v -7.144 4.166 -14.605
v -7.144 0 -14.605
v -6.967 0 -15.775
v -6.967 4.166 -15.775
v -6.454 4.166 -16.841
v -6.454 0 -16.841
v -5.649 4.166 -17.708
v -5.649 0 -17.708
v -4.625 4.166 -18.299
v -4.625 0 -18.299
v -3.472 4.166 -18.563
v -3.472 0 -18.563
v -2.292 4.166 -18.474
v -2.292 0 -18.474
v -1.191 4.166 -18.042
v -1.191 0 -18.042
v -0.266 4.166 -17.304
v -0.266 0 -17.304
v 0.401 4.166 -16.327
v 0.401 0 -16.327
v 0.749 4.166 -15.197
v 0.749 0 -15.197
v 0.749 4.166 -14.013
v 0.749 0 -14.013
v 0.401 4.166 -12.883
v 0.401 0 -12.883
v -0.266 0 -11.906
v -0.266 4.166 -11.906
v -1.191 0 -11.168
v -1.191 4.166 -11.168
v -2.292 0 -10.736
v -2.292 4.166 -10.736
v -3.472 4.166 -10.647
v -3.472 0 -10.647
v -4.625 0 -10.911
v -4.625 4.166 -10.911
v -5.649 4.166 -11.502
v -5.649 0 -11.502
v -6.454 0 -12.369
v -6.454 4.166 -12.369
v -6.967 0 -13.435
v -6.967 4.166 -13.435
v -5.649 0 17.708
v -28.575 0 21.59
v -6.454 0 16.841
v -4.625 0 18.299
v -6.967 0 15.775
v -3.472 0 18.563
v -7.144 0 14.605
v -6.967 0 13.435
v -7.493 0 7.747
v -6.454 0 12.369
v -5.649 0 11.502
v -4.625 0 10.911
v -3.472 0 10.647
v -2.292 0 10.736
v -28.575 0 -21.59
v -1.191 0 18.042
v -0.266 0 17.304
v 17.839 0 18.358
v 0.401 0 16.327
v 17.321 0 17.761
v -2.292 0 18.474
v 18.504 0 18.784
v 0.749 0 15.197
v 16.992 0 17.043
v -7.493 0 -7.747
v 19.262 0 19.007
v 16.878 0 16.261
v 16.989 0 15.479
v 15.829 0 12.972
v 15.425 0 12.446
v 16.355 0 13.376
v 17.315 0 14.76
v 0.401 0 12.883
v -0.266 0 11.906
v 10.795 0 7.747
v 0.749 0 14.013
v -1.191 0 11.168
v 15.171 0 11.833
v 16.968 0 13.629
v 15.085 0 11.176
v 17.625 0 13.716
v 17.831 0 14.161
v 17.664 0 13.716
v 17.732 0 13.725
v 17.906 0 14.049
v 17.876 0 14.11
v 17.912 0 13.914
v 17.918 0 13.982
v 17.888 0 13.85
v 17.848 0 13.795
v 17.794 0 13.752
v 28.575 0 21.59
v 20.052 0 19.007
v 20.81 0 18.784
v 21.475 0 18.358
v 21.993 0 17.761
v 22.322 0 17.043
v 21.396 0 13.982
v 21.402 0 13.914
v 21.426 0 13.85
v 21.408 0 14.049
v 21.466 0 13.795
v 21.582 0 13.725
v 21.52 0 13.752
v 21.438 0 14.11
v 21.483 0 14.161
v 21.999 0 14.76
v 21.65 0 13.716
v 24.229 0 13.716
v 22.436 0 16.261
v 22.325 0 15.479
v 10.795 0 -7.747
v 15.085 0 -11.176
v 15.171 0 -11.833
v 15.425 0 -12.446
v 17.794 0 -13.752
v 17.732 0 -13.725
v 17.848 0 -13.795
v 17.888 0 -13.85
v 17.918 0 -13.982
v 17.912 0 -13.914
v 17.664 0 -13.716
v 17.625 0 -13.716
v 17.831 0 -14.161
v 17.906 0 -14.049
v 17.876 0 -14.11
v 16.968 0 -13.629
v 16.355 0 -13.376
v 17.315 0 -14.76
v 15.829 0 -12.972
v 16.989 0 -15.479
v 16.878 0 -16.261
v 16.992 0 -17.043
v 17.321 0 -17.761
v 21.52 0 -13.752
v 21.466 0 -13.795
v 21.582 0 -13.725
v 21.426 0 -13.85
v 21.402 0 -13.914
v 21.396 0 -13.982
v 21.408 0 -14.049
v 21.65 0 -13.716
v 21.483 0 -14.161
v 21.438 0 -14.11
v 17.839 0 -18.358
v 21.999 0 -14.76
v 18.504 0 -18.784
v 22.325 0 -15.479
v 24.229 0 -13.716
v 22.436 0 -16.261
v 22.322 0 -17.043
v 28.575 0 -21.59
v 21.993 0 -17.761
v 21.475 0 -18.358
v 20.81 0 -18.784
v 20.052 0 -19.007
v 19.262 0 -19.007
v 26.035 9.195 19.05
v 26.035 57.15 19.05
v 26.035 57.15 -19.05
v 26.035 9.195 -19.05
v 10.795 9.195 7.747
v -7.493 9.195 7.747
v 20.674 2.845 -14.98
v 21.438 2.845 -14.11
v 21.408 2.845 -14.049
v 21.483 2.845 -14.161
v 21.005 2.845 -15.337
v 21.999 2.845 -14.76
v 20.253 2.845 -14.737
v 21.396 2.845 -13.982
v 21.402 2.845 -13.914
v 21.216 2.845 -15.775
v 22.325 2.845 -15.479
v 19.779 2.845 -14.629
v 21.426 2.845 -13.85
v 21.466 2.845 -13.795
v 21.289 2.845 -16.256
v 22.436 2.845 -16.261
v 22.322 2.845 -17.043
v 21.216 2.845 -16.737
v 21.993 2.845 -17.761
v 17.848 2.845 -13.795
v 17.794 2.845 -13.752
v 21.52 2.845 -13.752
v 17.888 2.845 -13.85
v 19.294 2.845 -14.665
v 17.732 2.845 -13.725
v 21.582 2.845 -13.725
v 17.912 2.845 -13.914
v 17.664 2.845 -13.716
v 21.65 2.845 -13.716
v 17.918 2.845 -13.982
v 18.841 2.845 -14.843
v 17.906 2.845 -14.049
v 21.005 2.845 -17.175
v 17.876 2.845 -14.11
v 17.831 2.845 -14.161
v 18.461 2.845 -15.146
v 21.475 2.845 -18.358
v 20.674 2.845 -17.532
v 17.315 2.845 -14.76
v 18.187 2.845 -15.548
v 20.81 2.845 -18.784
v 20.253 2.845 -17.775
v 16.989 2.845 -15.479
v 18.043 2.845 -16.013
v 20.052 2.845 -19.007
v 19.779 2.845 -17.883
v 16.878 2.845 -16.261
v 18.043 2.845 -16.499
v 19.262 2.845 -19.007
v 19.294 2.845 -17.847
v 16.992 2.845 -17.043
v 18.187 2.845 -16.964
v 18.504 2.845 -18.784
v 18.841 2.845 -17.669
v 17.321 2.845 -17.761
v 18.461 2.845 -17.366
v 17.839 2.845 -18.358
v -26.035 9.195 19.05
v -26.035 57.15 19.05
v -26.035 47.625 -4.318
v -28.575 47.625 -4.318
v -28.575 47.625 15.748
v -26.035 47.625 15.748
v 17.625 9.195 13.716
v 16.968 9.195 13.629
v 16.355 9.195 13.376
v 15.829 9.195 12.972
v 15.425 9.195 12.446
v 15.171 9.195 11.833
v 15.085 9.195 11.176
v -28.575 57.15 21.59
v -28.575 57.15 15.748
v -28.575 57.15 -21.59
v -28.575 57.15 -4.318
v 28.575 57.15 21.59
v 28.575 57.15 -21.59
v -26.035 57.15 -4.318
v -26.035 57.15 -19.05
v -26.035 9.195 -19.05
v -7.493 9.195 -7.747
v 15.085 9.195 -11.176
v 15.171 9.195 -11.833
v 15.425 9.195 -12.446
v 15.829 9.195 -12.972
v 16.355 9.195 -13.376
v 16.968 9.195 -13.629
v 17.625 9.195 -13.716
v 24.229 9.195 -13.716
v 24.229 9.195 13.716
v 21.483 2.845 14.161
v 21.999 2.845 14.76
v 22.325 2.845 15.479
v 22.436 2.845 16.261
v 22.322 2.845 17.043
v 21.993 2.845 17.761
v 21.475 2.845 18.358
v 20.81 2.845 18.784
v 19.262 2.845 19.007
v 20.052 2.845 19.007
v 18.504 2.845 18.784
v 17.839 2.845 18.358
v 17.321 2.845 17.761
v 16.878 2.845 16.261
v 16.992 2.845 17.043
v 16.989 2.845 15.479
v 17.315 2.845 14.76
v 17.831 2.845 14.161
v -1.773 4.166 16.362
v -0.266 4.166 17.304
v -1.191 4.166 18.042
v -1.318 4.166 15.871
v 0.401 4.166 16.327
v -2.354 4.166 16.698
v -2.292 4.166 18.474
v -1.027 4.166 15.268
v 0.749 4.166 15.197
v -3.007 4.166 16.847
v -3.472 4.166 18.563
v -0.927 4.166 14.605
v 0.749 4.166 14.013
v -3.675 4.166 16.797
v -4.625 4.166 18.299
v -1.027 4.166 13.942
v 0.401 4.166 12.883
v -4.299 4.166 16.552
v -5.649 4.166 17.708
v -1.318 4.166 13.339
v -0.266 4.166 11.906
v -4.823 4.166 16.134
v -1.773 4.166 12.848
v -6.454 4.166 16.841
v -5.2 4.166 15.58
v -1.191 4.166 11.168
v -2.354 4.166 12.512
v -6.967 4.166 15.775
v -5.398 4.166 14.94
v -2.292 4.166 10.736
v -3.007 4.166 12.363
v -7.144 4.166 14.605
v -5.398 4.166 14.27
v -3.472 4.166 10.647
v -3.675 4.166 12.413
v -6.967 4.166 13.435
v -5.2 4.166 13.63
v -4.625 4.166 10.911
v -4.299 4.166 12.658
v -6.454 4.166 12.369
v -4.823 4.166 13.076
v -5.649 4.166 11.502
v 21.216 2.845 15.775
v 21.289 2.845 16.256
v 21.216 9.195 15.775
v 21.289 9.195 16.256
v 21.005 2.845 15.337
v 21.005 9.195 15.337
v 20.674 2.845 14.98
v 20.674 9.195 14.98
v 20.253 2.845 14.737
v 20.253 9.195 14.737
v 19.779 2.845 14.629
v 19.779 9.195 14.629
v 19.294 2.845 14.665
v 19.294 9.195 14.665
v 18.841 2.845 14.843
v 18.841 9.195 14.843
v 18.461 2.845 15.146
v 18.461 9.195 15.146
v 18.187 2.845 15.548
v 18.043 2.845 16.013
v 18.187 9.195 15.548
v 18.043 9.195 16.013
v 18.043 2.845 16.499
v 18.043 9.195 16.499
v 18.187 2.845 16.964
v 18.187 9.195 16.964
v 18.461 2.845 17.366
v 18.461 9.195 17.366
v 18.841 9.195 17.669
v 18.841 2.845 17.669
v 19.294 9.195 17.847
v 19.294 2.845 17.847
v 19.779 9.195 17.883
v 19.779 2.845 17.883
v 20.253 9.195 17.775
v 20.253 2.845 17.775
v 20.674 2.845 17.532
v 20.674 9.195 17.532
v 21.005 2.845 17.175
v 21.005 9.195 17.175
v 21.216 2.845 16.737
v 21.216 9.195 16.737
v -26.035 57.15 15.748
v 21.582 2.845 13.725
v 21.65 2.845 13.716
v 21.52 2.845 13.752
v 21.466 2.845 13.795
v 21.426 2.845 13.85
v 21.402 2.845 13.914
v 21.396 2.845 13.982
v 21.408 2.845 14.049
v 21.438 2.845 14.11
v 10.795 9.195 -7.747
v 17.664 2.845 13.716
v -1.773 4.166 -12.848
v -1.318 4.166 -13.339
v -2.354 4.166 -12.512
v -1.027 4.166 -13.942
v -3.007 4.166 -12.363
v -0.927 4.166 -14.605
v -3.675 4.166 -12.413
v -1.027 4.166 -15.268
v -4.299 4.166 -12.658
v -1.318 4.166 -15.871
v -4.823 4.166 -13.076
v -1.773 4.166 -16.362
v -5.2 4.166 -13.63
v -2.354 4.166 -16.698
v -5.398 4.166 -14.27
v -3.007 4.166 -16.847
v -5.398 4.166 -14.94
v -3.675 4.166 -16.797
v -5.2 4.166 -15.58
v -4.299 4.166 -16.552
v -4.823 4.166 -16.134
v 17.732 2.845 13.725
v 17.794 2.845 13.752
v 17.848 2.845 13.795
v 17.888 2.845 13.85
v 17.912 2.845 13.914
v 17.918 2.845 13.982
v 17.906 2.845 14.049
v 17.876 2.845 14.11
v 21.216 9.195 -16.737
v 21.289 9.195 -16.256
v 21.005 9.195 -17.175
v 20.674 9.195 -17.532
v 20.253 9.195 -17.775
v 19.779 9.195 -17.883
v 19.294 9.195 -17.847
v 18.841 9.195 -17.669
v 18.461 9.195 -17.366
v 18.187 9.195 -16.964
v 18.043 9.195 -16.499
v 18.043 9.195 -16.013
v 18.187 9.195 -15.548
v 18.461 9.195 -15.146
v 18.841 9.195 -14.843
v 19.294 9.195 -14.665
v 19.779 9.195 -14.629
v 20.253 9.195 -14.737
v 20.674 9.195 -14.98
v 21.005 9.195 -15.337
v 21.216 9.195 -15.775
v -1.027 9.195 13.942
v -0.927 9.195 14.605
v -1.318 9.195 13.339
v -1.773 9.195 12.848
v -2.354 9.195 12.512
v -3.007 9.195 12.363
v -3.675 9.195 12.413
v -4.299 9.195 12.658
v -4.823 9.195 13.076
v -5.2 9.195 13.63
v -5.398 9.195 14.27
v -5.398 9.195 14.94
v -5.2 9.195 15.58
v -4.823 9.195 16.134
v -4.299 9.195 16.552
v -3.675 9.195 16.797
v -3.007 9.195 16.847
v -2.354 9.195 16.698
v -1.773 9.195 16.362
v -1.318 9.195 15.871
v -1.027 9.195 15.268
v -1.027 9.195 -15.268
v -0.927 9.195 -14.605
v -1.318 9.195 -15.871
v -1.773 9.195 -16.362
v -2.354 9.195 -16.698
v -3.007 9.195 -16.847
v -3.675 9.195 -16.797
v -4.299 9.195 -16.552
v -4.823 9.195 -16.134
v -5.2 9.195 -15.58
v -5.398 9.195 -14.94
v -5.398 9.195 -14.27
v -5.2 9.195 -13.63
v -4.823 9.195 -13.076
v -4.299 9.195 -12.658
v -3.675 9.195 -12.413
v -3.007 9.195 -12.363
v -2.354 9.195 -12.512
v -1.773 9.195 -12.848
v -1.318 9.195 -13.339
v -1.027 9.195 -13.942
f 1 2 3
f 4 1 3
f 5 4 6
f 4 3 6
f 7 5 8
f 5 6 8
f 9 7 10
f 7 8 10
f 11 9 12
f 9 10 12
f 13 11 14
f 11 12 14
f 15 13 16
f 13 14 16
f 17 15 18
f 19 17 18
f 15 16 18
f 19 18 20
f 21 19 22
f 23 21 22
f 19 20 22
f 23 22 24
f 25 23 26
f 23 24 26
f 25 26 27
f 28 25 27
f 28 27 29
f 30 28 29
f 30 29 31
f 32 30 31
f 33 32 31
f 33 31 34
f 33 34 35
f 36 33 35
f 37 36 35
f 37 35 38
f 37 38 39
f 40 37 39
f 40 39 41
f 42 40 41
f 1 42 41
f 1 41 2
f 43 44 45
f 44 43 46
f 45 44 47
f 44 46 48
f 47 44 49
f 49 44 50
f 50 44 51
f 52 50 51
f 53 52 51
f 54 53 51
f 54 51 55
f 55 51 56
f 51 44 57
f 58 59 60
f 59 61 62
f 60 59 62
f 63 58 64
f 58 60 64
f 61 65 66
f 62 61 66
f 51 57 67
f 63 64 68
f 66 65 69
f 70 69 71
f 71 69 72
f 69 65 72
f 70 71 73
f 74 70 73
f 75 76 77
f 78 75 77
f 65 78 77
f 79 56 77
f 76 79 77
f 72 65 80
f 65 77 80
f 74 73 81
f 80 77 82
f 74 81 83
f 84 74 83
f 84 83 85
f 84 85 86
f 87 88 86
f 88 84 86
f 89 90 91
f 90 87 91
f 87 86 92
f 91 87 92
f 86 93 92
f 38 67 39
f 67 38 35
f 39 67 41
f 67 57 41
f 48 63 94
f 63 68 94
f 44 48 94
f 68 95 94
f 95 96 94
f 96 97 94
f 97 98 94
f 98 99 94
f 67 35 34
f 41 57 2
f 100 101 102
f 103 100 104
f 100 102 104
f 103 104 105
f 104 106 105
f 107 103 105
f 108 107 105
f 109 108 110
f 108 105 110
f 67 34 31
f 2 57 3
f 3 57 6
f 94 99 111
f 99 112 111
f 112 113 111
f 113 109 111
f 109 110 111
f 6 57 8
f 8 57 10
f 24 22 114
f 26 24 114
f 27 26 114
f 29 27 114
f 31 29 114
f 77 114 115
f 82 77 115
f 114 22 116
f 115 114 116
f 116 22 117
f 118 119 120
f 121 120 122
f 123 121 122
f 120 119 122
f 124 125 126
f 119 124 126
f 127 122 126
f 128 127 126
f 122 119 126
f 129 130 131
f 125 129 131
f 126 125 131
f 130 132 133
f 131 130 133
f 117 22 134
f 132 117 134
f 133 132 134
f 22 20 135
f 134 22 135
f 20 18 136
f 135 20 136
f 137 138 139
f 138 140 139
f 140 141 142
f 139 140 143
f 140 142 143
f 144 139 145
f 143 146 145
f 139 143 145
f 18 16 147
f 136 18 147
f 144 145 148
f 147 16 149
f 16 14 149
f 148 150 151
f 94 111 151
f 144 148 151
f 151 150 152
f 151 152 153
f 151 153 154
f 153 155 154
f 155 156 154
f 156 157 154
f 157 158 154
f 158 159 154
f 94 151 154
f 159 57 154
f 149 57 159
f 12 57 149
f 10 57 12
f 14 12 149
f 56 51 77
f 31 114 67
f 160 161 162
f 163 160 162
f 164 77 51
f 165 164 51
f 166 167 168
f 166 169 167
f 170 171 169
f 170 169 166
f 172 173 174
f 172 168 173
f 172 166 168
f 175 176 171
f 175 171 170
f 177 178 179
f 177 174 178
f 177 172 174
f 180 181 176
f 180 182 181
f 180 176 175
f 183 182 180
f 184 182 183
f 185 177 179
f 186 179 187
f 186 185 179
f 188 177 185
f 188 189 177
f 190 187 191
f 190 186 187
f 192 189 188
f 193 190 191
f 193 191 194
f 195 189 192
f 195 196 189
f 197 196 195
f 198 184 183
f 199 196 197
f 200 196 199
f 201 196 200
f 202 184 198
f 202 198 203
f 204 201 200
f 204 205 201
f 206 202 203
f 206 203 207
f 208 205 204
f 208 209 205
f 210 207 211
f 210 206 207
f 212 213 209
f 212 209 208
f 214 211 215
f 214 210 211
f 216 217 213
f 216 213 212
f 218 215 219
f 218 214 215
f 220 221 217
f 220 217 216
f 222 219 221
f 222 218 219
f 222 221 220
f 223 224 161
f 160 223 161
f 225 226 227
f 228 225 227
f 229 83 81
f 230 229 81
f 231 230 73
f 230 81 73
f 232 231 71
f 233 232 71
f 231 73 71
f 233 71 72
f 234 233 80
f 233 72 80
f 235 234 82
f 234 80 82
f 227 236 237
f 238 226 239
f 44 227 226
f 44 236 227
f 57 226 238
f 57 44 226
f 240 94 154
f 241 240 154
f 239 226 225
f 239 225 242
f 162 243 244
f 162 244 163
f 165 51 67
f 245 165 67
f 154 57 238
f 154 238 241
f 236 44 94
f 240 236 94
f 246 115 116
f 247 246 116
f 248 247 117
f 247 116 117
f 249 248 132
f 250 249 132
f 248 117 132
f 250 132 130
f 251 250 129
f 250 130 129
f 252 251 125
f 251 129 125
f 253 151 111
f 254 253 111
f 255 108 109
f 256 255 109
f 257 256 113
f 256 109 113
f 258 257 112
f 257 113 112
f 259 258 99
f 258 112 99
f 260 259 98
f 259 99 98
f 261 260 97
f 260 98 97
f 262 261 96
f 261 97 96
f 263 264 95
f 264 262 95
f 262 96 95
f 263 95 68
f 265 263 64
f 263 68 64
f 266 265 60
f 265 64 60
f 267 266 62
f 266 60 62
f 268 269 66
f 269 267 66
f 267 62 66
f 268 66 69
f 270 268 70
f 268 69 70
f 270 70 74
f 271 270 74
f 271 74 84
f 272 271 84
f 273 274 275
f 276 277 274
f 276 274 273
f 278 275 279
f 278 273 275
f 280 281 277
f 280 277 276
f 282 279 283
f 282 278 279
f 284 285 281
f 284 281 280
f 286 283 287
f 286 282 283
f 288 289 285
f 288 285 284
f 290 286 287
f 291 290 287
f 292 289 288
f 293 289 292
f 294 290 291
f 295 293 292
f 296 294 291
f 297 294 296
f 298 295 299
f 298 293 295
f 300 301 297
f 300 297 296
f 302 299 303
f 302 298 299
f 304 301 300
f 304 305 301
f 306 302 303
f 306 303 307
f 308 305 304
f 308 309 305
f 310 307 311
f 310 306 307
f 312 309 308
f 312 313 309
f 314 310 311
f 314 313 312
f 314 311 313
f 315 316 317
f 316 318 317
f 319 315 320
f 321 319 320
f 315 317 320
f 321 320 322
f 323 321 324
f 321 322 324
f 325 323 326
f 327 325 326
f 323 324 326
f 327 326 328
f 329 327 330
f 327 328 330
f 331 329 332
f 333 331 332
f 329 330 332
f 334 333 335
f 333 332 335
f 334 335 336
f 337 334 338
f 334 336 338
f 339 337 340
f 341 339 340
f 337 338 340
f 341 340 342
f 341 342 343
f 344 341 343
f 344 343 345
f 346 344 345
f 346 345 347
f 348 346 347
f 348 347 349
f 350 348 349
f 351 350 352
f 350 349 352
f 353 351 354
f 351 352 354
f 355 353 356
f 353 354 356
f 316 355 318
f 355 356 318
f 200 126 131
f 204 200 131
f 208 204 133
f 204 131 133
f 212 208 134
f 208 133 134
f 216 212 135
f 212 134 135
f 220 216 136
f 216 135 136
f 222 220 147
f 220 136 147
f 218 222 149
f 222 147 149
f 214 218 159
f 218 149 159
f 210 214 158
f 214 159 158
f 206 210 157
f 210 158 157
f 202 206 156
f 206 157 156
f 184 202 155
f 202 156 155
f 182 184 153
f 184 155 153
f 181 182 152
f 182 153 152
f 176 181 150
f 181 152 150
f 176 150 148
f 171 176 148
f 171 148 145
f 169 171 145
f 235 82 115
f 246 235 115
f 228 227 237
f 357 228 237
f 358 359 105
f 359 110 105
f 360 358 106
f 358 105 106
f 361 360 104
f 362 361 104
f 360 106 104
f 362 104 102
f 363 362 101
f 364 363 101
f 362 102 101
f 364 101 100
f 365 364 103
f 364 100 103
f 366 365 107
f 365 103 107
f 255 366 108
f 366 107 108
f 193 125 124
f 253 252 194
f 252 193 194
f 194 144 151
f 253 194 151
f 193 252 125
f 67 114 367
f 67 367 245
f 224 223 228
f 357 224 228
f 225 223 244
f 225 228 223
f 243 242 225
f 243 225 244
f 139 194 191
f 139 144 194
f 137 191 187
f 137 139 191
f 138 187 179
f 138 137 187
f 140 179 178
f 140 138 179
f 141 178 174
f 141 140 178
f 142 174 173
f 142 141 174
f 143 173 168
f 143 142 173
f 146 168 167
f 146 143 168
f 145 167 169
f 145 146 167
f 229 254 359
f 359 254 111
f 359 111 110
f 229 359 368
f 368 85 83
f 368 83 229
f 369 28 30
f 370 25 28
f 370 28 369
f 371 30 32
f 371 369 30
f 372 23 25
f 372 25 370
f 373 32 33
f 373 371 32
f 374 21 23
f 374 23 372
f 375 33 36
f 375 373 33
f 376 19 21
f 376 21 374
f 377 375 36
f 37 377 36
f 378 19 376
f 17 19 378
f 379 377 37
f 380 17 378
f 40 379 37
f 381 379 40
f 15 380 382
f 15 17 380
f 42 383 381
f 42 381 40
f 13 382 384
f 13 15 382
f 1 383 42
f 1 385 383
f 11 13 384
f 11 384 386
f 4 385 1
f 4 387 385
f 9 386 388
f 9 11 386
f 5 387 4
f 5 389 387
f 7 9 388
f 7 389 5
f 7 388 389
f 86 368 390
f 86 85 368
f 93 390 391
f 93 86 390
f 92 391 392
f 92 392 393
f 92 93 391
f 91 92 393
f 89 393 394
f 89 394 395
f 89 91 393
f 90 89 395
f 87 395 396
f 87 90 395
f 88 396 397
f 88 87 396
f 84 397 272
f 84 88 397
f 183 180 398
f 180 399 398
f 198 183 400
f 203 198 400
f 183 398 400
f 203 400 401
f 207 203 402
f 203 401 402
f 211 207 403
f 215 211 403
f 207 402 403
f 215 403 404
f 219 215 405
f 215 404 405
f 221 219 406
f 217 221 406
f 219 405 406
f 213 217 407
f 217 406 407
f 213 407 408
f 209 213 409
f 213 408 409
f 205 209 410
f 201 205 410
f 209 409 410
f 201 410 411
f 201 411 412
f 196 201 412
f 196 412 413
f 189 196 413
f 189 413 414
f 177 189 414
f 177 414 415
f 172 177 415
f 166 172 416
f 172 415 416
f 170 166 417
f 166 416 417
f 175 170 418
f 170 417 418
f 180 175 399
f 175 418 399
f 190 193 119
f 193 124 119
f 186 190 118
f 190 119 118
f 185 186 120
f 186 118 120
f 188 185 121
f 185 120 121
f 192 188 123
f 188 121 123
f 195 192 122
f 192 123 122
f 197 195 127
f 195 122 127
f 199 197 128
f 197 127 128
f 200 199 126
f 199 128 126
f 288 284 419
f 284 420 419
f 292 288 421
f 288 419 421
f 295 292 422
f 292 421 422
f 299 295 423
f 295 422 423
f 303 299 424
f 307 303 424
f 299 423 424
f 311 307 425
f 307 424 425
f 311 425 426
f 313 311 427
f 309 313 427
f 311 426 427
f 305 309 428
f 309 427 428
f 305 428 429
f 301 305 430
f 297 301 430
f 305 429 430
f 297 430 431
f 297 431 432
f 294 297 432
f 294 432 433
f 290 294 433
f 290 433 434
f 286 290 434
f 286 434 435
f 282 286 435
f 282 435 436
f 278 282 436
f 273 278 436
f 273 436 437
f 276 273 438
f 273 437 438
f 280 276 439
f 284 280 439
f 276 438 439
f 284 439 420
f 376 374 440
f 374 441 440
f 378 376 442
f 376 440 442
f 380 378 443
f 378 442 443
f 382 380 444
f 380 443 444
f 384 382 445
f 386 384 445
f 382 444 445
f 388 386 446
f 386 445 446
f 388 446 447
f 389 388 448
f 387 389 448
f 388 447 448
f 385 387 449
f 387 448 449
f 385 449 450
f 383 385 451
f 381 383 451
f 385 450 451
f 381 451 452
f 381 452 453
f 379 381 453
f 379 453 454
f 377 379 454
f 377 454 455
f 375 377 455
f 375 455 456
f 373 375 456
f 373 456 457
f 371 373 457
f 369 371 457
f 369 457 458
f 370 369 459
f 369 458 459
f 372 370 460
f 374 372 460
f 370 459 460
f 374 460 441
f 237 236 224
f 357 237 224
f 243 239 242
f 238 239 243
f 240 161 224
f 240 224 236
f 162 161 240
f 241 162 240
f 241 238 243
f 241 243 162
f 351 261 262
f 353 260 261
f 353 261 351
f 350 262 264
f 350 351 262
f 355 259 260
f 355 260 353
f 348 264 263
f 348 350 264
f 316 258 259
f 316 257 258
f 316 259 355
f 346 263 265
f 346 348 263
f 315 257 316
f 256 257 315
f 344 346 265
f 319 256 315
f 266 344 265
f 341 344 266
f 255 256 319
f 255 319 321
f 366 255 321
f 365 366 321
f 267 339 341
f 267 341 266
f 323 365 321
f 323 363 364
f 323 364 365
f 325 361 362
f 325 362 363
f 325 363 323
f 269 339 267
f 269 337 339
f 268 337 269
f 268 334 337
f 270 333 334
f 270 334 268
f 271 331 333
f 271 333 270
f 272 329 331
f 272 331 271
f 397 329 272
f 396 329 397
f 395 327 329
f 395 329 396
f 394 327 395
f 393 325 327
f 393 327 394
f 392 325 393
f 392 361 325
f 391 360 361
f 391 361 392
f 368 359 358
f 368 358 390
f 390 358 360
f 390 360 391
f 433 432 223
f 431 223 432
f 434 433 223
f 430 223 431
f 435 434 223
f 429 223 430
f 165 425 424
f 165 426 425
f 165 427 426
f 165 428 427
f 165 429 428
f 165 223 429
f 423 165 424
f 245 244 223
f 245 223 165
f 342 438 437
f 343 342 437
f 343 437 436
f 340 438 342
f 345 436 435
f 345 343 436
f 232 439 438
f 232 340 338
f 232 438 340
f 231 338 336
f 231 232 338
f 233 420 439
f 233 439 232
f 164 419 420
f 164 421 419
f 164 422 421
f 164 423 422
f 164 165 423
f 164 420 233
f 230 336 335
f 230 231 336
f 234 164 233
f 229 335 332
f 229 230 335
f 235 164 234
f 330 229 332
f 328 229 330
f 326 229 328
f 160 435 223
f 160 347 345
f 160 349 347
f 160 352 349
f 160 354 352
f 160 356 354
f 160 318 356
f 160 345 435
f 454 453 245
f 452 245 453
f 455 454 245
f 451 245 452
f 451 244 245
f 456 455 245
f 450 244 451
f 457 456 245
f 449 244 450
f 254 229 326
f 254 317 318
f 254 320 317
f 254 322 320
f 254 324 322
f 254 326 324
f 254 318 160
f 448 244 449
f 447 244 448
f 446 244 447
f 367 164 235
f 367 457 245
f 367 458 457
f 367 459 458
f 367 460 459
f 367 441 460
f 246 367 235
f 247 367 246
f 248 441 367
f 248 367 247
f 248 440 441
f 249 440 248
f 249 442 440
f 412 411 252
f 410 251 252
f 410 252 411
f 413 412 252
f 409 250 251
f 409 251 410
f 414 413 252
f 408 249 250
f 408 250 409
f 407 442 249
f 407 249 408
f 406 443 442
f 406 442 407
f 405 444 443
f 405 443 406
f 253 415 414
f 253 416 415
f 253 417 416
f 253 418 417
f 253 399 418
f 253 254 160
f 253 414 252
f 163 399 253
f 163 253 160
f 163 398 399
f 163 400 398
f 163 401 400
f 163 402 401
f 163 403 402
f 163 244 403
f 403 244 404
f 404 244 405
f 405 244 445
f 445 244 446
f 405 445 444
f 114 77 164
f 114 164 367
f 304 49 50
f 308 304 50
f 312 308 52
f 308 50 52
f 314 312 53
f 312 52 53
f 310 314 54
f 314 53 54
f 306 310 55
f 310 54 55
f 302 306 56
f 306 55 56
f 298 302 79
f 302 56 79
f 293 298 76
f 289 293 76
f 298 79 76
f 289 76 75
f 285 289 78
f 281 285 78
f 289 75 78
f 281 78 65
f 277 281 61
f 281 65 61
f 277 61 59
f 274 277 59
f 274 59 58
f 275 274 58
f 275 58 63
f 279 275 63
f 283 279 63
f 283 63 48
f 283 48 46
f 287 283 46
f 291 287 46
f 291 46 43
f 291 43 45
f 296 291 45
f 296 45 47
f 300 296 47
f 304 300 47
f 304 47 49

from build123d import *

# Parameters (mm, degrees)
SKETCH1_W                                      = 57.15
SKETCH1_H                                      = 43.18
BASE_DEPTH                                     = 57.15
SKETCH2_W                                      = 52.07
SKETCH2_H                                      = 38.1
POCKET_DEPTH                                   = 47.9552
SKETCH3_W                                      = 18.288
SKETCH3_H                                      = 15.494
LINACTHOLE_DEPTH                               = 68.44465305
ROLLMOTORHOLE_REACH                            = 85.656
SKETCH4_W                                      = 20.066
SKETCH4_H                                      = 9.525
DVIHOLE_REACH                                  = 69.445
CBORE_FOR_4_SOCKET_HEAD_CAP_SCREW1_D           = 3.2639
CBORE_FOR_4_SOCKET_HEAD_CAP_SCREW1_CBORE_D     = 5.55752
CBORE_FOR_4_SOCKET_HEAD_CAP_SCREW1_CBORE_DEPTH = 2.8448
CBORE_FOR_8_SOCKET_HEAD_CAP_SCREW1_D           = 4.4958
CBORE_FOR_8_SOCKET_HEAD_CAP_SCREW1_CBORE_D     = 7.9375
CBORE_FOR_8_SOCKET_HEAD_CAP_SCREW1_CBORE_DEPTH = 4.1656
FILLET1_R                                      = 0.254


with BuildPart() as part:
    # Sketch1 → Base (new body)
    with BuildSketch(Plane(origin=(0, 0, 0), x_dir=(1, 0, 0), z_dir=(0, 1, 0))):
        Rectangle(SKETCH1_W, SKETCH1_H)
    extrude(amount=BASE_DEPTH)

    # Sketch2 → Pocket (cut)
    with BuildSketch(Plane(origin=(0, 57.15, 0), x_dir=(1, 0, 0), z_dir=(0, 1, 0))):
        Rectangle(SKETCH2_W, SKETCH2_H)
    extrude(amount=-POCKET_DEPTH, mode=Mode.SUBTRACT)

    # Sketch3 → LinActHole (cut, through all)
    with BuildSketch(Plane(origin=(0, 0, 0), x_dir=(-1, 0, 0), z_dir=(0, -1, 0))):
        with Locations((-1.651, 0)):
            Rectangle(SKETCH3_W, SKETCH3_H)
    extrude(amount=-LINACTHOLE_DEPTH, mode=Mode.SUBTRACT)

    # Sketch4 → RollMotorHole (cut, up to next)
    with BuildSketch(Plane.ZY.offset(28.575), mode=Mode.PRIVATE) as rollmotorhole_sk1:
        with Locations((5.715, 52.3875)):
            Rectangle(SKETCH4_W, SKETCH4_H)
    rollmotorhole_tool1 = extrude(rollmotorhole_sk1.sketch, amount=-ROLLMOTORHOLE_REACH, mode=Mode.PRIVATE) & part.part
    add(rollmotorhole_tool1.solids().sort_by_distance((-28.575, 52.3875, 5.715))[0], mode=Mode.SUBTRACT)

    # Sketch5 → DviHole (cut, up to next)
    with BuildSketch(Plane.XZ, mode=Mode.PRIVATE) as dvihole_sk1:
        with BuildLine():
            Line((17.624947543, -13.716), (24.228947543, -13.716))
            Line((24.228947543, -13.716), (24.228947543, 13.716))
            Line((24.228947543, 13.716), (17.624947543, 13.716))
            ThreePointArc((17.624947543, 13.716), (15.828896319, 12.972051224), (15.084947543, 11.176))
            Line((15.084947543, 11.176), (15.084947543, -11.176))
            ThreePointArc((15.084947543, -11.176), (15.828896319, -12.972051224), (17.624947543, -13.716))
        make_face()
    dvihole_tool1 = extrude(dvihole_sk1.sketch, amount=-DVIHOLE_REACH, mode=Mode.PRIVATE) & part.part
    add(dvihole_tool1.solids().sort_by_distance((19.701649, 0, 0))[0], mode=Mode.SUBTRACT)

    # CBORE for #4 Socket Head Cap Screw1 (through all)
    with Locations(Plane(origin=(0, 0, 0), x_dir=(-1, 0, 0), z_dir=(0, -1, 0))):
        with Locations((-19.656947543, 16.256), (-19.656947543, -16.256)):
            CounterBoreHole(CBORE_FOR_4_SOCKET_HEAD_CAP_SCREW1_D / 2, CBORE_FOR_4_SOCKET_HEAD_CAP_SCREW1_CBORE_D / 2, CBORE_FOR_4_SOCKET_HEAD_CAP_SCREW1_CBORE_DEPTH)

    # CBORE for #8 Socket Head Cap Screw1 (through all)
    with Locations(Plane(origin=(0, 0, 0), x_dir=(-1, 0, 0), z_dir=(0, -1, 0))):
        with Locations((3.175, 14.605), (3.175, -14.605)):
            CounterBoreHole(CBORE_FOR_8_SOCKET_HEAD_CAP_SCREW1_D / 2, CBORE_FOR_8_SOCKET_HEAD_CAP_SCREW1_CBORE_D / 2, CBORE_FOR_8_SOCKET_HEAD_CAP_SCREW1_CBORE_DEPTH)

    # Fillet1
    fillet1_edges = [part.edges().sort_by_distance(p)[0] for p in [
        (20.783849108, 1.4224, 13.716),
        (18.530045978, 1.4224, 13.716),
        (18.530045978, 1.4224, -13.716),
        (20.783849108, 1.4224, -13.716),
    ]]
    fillet(fillet1_edges, radius=FILLET1_R)


solid = part.part
